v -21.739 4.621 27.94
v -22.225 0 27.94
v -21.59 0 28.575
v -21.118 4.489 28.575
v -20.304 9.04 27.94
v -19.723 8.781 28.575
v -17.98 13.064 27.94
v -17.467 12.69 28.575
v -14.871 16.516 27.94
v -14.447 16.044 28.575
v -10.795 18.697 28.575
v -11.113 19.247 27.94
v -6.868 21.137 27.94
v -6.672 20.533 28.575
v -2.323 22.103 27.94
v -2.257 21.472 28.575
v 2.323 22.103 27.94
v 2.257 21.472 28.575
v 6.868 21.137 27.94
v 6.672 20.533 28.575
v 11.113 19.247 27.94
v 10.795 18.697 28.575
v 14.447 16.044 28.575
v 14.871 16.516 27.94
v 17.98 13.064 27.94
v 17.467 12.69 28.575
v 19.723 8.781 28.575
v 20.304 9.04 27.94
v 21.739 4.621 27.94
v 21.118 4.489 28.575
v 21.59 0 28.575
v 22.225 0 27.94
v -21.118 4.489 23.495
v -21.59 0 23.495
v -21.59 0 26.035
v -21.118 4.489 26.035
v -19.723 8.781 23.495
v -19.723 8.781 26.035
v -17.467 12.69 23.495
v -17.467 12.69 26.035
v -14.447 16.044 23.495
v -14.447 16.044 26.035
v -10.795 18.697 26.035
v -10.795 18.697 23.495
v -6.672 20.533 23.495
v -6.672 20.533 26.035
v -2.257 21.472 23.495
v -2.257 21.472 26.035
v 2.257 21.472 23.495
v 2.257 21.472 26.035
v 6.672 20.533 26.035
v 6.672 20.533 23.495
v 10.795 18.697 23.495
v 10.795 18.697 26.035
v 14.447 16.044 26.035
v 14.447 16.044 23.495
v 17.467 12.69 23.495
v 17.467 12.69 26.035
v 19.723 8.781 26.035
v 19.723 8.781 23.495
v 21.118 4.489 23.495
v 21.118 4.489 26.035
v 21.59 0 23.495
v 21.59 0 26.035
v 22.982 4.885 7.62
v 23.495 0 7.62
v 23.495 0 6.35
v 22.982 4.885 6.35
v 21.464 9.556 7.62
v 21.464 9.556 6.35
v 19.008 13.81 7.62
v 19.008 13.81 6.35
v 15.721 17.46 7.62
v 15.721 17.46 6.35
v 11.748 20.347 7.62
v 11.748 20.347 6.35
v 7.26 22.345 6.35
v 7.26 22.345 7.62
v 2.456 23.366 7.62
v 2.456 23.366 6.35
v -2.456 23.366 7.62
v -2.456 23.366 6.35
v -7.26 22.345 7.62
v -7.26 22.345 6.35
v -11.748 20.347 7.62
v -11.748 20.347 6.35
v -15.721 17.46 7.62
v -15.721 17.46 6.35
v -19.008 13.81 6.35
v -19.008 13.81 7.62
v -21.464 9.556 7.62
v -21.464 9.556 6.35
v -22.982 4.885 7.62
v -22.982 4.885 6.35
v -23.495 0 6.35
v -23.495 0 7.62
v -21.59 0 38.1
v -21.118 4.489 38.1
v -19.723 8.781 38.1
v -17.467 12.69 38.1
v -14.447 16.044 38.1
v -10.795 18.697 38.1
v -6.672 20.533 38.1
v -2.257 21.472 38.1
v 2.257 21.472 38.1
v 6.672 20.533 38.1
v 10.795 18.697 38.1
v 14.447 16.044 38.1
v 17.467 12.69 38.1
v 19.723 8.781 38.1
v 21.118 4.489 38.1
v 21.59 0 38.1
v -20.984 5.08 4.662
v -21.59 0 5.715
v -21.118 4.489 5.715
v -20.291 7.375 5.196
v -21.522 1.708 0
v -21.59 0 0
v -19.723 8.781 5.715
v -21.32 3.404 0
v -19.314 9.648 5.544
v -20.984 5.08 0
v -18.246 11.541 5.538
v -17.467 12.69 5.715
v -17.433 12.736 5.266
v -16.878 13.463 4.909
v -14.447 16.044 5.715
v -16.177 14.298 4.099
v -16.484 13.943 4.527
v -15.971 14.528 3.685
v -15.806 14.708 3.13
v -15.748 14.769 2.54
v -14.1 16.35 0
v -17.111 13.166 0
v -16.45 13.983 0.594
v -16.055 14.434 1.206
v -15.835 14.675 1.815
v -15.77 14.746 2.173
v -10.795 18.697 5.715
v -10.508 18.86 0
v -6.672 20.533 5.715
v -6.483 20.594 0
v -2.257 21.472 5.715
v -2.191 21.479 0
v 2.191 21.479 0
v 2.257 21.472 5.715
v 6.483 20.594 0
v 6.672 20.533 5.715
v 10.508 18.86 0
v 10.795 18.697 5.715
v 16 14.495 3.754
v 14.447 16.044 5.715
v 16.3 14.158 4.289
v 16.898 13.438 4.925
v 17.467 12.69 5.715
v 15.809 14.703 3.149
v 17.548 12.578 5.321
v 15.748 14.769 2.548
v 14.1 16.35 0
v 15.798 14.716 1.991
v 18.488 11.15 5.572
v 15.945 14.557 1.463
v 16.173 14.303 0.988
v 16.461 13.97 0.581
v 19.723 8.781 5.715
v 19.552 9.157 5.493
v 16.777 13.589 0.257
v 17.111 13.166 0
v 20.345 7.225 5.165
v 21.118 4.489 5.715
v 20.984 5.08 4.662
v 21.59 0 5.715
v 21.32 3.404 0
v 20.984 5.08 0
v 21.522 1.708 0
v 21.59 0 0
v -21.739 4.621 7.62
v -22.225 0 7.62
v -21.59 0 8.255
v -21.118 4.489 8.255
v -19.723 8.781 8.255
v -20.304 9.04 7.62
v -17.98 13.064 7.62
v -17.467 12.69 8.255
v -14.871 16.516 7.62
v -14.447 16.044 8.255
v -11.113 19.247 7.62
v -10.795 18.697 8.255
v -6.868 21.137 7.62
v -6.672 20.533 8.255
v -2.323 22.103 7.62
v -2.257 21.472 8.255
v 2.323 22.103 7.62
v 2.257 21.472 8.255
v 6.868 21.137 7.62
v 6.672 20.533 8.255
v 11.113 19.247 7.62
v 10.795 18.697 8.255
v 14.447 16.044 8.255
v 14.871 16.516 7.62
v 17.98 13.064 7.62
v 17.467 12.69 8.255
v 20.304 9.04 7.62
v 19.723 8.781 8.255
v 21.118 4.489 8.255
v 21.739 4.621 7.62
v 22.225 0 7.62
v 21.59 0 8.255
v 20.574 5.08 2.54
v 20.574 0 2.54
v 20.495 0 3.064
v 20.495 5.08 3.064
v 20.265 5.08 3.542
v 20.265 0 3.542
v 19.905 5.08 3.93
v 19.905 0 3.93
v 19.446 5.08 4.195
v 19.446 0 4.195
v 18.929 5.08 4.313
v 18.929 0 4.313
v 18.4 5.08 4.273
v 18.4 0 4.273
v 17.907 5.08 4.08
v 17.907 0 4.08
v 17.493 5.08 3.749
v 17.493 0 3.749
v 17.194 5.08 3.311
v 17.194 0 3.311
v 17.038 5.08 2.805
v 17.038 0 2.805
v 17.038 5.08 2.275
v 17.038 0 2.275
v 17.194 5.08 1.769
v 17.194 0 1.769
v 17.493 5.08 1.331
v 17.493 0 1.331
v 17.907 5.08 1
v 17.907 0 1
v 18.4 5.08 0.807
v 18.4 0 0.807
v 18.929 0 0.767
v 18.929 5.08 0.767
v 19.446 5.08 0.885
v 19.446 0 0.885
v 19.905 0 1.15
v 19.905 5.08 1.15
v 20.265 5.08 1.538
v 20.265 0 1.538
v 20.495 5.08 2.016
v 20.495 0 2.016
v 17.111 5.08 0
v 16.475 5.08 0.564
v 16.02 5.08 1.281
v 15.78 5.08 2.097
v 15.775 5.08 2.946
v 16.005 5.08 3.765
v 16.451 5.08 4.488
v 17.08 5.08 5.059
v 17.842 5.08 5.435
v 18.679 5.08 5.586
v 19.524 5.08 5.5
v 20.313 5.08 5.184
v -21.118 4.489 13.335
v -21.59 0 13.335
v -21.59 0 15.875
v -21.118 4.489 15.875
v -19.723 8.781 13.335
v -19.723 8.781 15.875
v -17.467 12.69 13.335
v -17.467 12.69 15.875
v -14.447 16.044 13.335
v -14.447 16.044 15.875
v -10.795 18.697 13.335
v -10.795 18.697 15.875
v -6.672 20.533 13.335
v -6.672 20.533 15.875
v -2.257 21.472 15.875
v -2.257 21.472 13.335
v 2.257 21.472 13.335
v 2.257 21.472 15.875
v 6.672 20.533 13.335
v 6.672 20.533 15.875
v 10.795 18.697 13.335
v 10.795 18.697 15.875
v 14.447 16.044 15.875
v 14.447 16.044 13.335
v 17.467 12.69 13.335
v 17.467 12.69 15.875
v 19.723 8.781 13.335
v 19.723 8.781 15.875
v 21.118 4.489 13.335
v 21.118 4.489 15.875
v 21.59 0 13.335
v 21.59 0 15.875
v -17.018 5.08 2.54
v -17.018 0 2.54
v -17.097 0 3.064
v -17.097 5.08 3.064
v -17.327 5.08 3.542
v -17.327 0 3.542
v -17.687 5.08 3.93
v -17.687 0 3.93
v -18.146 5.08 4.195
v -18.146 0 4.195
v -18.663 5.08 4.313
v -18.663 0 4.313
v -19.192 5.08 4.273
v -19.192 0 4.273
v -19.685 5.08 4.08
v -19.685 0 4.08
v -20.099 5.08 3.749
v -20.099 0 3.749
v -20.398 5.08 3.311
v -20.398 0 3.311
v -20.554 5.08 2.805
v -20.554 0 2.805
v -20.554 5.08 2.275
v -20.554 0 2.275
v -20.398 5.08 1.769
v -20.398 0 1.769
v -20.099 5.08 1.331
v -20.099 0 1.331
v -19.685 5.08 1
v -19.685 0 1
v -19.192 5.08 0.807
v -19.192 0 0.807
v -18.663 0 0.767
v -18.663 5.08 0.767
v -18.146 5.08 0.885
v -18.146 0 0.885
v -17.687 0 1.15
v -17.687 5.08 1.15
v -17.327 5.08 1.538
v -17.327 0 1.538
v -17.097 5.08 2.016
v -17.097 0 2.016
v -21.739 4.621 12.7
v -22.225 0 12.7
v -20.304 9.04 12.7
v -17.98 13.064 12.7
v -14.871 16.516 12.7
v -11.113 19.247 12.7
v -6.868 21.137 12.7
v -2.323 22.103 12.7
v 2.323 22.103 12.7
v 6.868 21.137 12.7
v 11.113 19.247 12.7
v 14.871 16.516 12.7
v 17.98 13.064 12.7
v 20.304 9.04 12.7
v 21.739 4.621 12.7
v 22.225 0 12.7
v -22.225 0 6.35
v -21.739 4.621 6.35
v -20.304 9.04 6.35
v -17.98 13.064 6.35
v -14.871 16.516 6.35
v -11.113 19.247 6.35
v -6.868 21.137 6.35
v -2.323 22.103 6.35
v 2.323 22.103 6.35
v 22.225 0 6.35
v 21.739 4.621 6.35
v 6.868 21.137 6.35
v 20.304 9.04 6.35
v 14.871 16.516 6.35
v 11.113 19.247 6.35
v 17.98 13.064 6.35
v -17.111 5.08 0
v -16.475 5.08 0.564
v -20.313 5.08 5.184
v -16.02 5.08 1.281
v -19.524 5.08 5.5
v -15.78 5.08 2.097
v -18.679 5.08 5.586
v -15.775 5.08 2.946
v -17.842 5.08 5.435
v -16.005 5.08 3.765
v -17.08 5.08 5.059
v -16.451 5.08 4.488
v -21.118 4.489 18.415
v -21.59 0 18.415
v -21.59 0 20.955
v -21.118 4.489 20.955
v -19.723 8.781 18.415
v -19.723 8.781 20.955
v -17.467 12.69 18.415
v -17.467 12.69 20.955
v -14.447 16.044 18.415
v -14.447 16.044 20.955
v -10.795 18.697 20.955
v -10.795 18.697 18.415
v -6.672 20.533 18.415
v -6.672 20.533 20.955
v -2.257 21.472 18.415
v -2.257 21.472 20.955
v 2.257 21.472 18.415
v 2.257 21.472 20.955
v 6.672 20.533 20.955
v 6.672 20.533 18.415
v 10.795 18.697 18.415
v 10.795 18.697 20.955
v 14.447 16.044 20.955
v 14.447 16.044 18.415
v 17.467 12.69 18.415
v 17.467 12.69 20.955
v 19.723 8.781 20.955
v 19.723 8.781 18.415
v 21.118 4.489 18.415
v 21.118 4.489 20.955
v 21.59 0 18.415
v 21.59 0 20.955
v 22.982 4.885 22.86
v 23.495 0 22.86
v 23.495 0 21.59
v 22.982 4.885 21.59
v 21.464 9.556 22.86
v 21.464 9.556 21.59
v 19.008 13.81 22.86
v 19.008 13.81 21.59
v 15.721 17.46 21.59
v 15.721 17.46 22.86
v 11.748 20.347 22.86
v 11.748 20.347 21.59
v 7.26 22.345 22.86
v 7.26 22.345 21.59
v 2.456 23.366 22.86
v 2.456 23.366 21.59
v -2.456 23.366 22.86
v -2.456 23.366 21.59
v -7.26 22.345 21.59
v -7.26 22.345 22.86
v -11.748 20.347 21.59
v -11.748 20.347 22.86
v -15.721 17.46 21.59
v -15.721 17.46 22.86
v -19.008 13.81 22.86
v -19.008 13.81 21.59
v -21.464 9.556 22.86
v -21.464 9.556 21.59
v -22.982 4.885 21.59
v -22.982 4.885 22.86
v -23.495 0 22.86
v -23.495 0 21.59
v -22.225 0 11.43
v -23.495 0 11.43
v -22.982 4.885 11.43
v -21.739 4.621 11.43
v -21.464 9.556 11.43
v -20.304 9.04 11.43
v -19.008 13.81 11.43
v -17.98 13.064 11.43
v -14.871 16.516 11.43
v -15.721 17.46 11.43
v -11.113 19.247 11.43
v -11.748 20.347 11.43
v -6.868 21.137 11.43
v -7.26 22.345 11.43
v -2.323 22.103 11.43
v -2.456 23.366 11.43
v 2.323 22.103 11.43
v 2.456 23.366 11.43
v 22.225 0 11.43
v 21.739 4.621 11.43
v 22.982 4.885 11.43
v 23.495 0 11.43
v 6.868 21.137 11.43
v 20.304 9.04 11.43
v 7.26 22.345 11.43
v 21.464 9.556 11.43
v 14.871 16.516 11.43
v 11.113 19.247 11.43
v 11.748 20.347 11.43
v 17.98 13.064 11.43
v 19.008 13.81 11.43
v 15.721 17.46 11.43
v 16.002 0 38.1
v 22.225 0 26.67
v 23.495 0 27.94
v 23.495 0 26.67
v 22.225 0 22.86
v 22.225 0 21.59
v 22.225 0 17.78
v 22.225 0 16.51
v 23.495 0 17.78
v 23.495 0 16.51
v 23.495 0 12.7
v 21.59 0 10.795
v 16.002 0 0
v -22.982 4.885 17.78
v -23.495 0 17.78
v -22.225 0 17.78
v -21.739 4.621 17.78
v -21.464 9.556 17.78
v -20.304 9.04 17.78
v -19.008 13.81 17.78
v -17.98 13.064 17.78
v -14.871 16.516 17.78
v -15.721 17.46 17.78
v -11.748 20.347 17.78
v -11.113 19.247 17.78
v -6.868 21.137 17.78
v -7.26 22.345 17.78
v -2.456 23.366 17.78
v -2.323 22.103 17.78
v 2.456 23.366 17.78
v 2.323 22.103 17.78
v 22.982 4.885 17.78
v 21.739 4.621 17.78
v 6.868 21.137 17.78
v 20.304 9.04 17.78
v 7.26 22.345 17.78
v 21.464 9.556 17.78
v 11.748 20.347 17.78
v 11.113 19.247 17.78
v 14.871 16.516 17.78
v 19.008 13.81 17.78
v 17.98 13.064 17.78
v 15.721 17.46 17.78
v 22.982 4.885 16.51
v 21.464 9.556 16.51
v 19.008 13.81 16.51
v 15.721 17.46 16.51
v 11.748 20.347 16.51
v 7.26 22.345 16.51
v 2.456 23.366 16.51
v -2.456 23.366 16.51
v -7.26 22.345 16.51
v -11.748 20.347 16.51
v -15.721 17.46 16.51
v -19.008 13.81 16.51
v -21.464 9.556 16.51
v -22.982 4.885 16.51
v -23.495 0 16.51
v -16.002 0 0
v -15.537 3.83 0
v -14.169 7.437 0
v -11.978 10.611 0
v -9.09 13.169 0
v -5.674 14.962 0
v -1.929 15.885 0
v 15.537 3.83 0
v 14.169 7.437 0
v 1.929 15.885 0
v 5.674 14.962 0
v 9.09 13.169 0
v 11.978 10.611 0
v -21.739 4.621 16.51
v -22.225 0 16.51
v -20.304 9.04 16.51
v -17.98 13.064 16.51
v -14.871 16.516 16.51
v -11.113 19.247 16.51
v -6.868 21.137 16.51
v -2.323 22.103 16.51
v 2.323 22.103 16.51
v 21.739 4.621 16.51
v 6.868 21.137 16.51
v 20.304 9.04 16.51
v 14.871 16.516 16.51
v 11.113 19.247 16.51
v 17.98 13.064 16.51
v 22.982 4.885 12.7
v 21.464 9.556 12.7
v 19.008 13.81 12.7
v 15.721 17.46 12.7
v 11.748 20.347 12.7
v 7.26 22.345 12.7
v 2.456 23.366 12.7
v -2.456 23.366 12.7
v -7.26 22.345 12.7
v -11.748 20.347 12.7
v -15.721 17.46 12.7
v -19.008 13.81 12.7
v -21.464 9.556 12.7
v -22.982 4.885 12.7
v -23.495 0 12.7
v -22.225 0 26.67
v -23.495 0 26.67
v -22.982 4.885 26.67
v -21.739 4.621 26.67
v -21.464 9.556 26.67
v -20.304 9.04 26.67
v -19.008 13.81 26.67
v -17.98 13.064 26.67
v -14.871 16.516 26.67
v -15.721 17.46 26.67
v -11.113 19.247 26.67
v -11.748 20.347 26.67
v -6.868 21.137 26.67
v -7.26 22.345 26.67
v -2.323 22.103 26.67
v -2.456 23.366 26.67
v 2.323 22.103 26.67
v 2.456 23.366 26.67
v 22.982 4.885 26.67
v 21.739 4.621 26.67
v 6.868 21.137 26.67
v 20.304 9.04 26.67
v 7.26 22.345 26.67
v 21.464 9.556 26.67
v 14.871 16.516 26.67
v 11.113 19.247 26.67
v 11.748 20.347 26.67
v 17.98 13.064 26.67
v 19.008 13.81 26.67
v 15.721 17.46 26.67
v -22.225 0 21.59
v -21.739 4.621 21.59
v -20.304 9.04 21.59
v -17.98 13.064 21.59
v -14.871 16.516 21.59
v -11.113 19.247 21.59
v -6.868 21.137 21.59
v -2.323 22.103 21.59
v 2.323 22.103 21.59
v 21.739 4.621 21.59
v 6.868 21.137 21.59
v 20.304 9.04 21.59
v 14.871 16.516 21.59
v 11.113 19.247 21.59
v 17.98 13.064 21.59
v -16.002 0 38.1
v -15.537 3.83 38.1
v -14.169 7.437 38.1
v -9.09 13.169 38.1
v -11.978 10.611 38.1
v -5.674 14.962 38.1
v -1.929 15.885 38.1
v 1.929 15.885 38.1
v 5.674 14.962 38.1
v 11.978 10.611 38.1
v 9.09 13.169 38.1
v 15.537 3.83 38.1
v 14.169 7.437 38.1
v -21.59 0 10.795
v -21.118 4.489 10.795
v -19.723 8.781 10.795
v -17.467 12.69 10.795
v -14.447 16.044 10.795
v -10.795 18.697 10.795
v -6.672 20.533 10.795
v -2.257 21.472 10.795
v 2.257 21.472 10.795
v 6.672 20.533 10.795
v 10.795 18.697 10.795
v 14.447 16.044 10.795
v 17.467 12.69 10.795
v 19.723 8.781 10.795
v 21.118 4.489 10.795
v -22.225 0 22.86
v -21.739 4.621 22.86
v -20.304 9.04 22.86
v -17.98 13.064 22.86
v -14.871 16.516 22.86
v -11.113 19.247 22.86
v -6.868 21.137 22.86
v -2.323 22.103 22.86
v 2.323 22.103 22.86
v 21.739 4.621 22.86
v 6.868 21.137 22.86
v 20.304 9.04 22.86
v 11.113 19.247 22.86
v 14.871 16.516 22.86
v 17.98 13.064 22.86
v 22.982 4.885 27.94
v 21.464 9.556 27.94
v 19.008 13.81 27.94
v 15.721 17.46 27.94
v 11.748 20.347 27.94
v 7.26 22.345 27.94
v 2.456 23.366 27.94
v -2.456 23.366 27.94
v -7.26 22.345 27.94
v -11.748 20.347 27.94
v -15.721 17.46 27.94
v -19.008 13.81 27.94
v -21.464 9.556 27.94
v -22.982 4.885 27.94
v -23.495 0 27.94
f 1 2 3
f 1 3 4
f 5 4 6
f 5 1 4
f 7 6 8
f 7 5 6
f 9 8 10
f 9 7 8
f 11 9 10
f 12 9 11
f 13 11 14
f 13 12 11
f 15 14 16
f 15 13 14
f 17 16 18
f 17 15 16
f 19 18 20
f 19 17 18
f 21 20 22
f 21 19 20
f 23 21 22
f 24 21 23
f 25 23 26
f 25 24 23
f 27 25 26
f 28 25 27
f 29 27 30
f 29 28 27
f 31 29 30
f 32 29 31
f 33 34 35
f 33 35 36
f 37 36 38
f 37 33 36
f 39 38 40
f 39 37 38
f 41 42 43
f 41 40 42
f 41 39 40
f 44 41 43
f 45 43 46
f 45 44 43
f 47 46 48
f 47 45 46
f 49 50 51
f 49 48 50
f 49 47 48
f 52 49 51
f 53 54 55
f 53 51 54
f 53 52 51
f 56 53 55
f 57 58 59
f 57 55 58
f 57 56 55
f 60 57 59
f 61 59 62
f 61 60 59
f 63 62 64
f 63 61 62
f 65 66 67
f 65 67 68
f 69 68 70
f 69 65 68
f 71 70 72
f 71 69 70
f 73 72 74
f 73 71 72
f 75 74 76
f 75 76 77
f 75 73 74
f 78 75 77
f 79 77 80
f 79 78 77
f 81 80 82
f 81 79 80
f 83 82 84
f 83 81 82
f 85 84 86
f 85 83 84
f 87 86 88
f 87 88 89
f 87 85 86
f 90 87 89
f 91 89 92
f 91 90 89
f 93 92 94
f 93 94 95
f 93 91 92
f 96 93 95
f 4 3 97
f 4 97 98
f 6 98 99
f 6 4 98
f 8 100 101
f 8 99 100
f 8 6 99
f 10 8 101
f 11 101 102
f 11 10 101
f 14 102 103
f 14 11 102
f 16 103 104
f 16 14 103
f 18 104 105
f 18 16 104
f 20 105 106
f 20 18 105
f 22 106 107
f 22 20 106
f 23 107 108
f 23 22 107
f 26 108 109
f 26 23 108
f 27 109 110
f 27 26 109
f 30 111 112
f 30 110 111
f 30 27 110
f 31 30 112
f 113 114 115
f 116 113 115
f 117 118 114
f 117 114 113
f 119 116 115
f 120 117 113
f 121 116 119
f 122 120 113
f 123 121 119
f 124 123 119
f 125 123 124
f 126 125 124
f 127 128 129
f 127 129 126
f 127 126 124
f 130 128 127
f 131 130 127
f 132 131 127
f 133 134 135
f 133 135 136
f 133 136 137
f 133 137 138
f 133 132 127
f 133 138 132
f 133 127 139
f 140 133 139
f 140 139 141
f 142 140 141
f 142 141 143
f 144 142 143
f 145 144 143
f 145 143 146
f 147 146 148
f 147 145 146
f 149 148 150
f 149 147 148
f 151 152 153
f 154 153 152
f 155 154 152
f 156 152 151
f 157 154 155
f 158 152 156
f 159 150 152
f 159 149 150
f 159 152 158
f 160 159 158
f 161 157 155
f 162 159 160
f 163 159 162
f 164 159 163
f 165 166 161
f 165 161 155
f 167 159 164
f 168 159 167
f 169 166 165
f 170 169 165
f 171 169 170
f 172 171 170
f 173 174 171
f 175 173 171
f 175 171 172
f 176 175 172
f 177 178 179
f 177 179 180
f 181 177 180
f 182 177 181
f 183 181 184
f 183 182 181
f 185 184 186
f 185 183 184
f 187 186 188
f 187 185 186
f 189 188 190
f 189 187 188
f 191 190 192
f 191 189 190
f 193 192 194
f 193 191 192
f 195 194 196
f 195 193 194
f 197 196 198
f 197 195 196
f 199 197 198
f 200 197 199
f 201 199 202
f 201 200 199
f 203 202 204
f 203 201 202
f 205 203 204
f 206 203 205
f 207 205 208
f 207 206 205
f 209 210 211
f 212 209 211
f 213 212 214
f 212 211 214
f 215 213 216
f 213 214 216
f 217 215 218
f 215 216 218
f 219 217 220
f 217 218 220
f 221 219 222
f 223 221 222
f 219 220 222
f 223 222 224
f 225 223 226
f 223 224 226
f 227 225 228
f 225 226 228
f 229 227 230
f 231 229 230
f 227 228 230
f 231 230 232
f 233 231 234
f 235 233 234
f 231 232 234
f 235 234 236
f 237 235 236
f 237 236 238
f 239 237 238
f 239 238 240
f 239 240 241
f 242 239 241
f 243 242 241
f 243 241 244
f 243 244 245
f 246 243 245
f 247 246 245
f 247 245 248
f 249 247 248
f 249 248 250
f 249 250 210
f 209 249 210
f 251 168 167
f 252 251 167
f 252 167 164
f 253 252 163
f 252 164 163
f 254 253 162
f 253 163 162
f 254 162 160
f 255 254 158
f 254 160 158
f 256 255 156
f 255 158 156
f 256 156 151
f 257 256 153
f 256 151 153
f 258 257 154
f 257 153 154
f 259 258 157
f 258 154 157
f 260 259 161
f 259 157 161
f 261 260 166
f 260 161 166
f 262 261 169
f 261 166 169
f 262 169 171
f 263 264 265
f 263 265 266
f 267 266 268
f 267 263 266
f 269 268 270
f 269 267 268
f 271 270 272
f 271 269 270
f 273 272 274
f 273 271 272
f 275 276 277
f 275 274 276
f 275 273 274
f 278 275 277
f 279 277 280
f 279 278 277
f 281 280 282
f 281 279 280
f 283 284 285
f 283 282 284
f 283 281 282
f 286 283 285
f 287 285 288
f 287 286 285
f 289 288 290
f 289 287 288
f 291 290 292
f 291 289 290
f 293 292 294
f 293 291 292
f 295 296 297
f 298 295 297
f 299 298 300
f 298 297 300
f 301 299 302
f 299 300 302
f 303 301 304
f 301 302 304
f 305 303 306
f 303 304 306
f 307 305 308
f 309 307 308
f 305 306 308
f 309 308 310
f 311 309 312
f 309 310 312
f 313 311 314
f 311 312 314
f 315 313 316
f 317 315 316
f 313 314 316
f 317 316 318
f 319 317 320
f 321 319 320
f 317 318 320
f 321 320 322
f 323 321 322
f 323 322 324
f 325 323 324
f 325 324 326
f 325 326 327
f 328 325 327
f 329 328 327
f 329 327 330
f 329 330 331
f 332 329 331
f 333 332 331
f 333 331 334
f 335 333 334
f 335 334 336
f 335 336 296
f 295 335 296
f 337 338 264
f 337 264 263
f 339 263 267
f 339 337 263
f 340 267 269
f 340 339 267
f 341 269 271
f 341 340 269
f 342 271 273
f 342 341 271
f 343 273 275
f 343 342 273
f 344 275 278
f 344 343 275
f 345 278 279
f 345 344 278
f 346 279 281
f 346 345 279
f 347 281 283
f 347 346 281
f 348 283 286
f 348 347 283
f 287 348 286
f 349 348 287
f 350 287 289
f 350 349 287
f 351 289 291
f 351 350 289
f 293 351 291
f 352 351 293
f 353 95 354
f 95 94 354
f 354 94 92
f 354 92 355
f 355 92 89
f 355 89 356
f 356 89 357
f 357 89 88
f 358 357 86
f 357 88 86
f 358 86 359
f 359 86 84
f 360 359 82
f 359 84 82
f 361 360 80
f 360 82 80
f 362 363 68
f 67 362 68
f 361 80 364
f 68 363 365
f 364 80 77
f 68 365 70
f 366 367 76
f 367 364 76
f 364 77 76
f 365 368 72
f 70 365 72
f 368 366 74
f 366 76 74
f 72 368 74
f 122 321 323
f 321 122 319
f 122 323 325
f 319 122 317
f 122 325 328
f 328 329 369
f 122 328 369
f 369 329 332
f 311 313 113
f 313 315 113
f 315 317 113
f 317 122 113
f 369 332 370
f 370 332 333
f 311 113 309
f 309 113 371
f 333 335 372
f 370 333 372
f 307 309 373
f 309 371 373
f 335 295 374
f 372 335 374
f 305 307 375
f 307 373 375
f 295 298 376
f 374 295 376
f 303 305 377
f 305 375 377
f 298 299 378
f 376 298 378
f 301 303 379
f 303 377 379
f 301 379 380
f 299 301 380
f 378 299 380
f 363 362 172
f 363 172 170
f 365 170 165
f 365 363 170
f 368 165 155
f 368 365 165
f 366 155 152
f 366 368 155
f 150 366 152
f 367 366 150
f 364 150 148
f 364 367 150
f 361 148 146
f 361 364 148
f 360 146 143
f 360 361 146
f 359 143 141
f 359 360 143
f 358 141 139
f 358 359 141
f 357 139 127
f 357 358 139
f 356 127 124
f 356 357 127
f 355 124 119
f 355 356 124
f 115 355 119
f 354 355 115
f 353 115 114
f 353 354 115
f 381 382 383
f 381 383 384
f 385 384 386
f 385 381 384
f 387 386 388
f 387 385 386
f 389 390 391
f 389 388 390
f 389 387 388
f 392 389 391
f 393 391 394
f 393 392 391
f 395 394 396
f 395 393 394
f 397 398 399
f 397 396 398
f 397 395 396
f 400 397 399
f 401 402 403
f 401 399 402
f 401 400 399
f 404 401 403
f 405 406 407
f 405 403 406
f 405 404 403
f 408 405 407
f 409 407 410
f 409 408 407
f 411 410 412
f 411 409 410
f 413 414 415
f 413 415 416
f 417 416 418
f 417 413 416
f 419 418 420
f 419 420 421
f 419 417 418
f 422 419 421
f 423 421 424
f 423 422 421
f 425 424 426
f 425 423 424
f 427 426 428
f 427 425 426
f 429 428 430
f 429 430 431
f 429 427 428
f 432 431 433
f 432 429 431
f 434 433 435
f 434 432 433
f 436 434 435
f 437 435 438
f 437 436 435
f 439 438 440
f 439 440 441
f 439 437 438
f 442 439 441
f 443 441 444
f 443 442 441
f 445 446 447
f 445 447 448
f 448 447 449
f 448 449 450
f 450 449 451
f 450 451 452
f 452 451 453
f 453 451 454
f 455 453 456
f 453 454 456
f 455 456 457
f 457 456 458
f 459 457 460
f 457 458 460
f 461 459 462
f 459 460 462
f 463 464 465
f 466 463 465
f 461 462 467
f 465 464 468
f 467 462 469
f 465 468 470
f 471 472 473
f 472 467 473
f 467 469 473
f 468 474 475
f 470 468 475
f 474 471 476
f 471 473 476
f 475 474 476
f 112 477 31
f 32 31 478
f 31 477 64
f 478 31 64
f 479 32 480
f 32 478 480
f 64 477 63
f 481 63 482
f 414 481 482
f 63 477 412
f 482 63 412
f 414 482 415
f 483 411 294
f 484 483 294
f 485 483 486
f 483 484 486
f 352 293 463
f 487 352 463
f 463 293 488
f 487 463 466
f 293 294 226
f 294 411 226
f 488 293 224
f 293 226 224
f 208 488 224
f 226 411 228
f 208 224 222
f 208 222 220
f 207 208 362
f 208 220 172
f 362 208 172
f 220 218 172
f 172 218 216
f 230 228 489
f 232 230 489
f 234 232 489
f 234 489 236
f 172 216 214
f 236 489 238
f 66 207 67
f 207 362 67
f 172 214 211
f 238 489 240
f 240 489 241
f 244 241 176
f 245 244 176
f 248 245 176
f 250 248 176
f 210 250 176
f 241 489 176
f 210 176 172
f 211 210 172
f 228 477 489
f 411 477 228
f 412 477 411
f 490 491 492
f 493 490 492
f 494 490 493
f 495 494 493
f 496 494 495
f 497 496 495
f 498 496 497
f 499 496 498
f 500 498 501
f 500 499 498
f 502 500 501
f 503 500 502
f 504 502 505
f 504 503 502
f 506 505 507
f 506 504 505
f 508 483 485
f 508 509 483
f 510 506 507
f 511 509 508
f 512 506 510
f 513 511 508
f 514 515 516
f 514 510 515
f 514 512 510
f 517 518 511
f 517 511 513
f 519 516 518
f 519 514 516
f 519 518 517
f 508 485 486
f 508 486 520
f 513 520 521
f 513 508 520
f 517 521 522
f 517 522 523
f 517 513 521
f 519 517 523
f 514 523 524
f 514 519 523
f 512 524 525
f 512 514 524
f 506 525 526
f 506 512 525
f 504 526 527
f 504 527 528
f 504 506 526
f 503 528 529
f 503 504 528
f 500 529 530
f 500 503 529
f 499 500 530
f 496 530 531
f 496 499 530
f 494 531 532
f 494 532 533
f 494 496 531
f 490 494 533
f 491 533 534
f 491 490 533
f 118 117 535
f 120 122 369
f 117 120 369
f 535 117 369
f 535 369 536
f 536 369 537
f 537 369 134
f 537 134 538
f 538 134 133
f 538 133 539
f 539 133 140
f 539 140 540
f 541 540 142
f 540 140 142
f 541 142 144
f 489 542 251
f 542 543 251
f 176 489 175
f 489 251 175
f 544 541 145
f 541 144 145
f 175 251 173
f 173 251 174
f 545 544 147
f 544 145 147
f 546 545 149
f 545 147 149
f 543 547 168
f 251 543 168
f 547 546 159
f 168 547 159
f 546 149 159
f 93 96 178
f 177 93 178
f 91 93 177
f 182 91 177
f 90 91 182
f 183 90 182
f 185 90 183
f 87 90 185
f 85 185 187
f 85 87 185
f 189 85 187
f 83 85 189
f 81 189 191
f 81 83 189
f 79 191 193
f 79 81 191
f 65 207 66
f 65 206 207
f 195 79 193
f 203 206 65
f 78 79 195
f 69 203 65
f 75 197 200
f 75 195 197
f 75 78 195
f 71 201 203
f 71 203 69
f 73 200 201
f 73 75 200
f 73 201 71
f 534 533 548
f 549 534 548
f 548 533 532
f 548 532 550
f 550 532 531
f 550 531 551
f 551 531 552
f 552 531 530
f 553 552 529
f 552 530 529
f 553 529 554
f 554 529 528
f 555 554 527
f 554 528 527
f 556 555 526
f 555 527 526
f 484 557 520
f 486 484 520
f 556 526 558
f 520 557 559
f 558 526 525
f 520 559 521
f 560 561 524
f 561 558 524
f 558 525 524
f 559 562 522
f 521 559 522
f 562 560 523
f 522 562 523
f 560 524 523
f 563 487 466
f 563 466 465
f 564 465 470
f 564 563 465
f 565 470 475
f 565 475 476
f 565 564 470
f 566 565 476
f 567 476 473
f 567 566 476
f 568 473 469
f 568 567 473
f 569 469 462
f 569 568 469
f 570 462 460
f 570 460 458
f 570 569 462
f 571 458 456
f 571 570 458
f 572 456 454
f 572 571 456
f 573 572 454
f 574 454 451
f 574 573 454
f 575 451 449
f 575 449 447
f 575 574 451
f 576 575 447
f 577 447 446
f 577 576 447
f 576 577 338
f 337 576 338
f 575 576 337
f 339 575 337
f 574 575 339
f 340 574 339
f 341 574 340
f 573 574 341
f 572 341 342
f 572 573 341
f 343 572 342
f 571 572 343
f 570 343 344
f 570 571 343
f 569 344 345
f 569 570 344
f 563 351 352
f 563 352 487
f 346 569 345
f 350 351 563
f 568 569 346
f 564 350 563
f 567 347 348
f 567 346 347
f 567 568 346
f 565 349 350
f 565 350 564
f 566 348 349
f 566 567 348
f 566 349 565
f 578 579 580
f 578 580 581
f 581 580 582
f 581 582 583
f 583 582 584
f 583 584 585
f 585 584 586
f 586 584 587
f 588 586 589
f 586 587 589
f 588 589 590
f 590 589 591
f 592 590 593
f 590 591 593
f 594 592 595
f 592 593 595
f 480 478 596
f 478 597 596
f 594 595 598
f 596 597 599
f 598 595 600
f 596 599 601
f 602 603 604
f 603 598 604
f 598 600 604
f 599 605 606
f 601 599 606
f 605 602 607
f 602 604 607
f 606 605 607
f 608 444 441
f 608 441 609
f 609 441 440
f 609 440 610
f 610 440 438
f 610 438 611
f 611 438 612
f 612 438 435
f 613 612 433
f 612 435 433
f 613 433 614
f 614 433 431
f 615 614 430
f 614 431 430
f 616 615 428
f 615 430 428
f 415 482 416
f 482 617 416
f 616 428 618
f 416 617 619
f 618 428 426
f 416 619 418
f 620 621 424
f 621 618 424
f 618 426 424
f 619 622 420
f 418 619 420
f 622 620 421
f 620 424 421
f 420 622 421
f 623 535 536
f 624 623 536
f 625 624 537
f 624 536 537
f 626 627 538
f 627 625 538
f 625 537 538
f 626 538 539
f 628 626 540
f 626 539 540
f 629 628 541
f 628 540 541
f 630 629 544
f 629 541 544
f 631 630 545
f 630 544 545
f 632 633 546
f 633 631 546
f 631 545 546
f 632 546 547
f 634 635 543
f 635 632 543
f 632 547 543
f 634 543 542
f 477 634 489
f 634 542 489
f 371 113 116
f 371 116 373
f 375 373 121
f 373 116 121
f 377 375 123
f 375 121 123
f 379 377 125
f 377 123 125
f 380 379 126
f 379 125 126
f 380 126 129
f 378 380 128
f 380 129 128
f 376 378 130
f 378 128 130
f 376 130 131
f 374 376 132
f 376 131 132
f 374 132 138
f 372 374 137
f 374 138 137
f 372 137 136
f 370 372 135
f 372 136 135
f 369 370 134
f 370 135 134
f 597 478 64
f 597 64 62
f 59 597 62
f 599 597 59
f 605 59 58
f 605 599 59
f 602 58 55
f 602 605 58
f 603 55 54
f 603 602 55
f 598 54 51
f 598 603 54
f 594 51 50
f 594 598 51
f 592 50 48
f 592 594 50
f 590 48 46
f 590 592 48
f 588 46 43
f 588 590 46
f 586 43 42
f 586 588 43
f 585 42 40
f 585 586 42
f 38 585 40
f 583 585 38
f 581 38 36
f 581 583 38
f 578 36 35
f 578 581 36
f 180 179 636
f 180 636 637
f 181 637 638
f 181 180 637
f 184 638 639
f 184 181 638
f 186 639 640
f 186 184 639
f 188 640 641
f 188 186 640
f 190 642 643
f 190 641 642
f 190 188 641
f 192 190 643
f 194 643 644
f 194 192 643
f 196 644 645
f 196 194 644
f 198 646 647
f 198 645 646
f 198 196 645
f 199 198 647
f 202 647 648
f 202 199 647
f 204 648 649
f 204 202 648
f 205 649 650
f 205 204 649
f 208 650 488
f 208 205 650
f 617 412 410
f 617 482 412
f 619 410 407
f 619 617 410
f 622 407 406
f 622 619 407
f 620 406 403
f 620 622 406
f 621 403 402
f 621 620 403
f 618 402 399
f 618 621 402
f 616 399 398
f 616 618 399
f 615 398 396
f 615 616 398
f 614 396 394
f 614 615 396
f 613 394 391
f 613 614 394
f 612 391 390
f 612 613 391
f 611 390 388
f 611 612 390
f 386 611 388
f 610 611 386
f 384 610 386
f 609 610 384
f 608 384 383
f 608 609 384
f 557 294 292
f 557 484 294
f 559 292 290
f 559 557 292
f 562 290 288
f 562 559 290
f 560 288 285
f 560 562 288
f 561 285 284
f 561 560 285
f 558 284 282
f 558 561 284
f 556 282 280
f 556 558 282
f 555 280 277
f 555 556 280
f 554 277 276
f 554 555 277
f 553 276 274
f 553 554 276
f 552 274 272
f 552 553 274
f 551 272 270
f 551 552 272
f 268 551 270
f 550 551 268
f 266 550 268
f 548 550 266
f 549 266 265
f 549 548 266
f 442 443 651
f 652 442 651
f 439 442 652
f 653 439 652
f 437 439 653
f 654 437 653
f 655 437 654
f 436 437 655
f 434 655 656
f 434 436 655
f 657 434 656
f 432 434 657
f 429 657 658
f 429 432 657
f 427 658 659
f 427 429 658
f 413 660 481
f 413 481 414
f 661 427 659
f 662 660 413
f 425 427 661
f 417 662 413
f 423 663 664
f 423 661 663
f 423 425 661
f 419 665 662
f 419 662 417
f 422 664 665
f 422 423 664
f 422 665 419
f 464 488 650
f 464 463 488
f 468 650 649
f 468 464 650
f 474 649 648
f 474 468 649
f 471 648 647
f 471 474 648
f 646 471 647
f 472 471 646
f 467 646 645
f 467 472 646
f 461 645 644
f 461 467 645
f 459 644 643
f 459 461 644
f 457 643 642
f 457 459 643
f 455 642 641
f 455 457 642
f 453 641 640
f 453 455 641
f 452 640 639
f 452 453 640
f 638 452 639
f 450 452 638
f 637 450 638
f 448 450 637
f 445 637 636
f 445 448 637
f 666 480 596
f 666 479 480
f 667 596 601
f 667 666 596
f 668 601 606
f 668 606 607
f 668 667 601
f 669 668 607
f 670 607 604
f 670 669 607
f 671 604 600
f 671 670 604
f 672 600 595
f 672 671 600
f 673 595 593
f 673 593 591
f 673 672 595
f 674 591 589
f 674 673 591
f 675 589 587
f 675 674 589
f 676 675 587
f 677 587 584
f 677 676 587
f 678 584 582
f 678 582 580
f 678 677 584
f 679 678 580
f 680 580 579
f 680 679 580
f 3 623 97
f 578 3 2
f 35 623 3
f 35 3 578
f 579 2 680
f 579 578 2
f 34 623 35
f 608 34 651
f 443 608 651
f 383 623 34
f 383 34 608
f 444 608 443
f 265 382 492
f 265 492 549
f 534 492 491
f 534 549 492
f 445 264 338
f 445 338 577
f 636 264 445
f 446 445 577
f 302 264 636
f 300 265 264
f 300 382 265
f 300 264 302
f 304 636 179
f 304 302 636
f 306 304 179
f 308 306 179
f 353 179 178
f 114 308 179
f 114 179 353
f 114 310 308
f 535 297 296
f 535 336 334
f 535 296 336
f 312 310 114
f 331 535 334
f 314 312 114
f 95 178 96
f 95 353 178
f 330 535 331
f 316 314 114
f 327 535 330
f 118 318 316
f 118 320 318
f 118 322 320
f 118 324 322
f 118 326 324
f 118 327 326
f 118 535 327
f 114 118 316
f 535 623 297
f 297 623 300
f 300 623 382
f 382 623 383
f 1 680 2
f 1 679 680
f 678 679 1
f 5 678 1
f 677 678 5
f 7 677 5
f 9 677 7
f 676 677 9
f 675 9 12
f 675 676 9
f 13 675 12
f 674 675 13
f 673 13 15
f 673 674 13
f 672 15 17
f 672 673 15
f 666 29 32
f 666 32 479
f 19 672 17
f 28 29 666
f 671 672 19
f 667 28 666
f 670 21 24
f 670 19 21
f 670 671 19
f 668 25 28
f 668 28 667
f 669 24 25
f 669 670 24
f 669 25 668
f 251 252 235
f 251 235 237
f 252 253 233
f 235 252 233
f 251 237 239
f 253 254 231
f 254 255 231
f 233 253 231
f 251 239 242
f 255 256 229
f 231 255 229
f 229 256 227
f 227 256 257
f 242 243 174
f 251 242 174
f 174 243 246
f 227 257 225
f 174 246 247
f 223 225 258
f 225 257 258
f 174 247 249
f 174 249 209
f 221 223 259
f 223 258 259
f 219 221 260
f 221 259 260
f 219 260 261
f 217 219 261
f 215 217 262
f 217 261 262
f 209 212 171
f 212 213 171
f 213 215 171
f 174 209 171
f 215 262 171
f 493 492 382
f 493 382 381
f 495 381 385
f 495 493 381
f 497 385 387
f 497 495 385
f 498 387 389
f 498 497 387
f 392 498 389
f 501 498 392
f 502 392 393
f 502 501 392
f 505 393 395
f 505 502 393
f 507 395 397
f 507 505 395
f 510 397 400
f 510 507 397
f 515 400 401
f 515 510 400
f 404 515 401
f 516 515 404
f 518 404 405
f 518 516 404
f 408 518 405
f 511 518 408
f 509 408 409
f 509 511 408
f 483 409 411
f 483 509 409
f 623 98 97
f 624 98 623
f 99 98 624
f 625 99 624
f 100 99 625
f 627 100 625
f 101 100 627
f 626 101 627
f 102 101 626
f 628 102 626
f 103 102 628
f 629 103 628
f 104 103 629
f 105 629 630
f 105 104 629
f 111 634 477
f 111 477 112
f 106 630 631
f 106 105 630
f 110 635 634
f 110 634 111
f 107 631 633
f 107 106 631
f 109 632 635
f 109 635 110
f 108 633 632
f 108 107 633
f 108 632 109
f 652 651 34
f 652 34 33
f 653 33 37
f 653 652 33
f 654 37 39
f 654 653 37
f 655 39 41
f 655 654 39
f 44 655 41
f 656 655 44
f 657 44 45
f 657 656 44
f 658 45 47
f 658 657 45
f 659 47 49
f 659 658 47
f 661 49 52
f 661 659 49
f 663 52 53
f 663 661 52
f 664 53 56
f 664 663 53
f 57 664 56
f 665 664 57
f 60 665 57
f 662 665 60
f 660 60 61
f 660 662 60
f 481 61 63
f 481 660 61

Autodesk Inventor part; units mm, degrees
ref_plane "YZ Plane" through (0, 0, 0) normal (1, 0, 0) x (0, 1, 0)
sketch "Sketch1" plane through (0, 0, 0) normal (0, 0, 1) x (1, 0, 0)
  arc A0 (16.002, 0) -> (-16.002, 0) centre (0, 0) ccw
  arc A1 (21.59, 0) -> (-21.59, 0) centre (0, 0) ccw
  line L0 (-16.002, 0) -> (-21.59, 0)
  line L1 (16.002, 0) -> (21.59, 0)
  dimension "d0" = 43.18
  dimension "d1" = 32.004
extrude "Extrusion1" add sketch "Sketch1" along normal blind 38.1
ref_plane "Work Plane1" through (0, 0, 27.94) normal (0, 0, 1) x (1, 0, 0)
sketch "Sketch2" plane through (0, 0, 27.94) normal (0, 0, 1) x (1, 0, 0)
  arc A0 (21.59, 0) -> (-21.59, 0) centre (0, 0) ccw projected
  arc A1 (23.495, 0) -> (-23.495, 0) centre (0, 0) ccw
  line L0 (-21.59, 0) -> (-23.495, 0)
  line L1 (16.002, 0) -> (21.59, 0) projected
  line L2 (23.495, 0) -> (21.59, 0)
  dimension "d5" = 1.905
extrude "Extrusion2" add sketch "Sketch2" against normal blind 1.27
chamfer "Chamfer1" distance 0.635 angle 45 2 edges at (0, 21.59, 27.94) (0, 21.59, 26.67)
pattern_linear "Rectangular Pattern1" count 5 spacing 5.08 along (0, 0, -1) of "Extrusion2", "Chamfer1"
sketch "Sketch3" plane through (16.002, 0, 0) normal (0, -1, 0) x (1, 0, 0)
  line L0 (0, 0) -> (5.588, 0) construction
  line L1 (5.588, 0) -> (5.588, 5.715) construction
  line L2 (6.223, 6.35) -> (5.588, 5.715) construction
  line L3 (7.493, 6.35) -> (6.223, 6.35) construction
  line L4 (7.493, 7.62) -> (7.493, 6.35) construction
  line L5 (7.493, 7.62) -> (6.223, 7.62) construction
  line L6 (5.588, 8.255) -> (6.223, 7.62) construction
  line L7 (5.588, 8.255) -> (5.588, 10.795) construction
  line L8 (6.223, 11.43) -> (5.588, 10.795) construction
  line L9 (7.493, 11.43) -> (6.223, 11.43) construction
  line L10 (7.493, 12.7) -> (7.493, 11.43) construction
  line L11 (7.493, 12.7) -> (6.223, 12.7) construction
  line L12 (5.588, 13.335) -> (6.223, 12.7) construction
  line L13 (5.588, 13.335) -> (5.588, 15.875) construction
  line L14 (6.223, 16.51) -> (5.588, 15.875) construction
  line L15 (7.493, 16.51) -> (6.223, 16.51) construction
  line L16 (7.493, 17.78) -> (7.493, 16.51) construction
  line L17 (7.493, 17.78) -> (6.223, 17.78) construction
  line L18 (5.588, 18.415) -> (6.223, 17.78) construction
  line L19 (5.588, 18.415) -> (5.588, 20.955) construction
  line L20 (6.223, 21.59) -> (5.588, 20.955) construction
  line L21 (7.493, 21.59) -> (6.223, 21.59) construction
  line L22 (7.493, 22.86) -> (7.493, 21.59) construction
  line L23 (7.493, 22.86) -> (6.223, 22.86) construction
  line L24 (5.588, 23.495) -> (6.223, 22.86) construction
  line L25 (5.588, 23.495) -> (5.588, 26.035) construction
  line L26 (6.223, 26.67) -> (5.588, 26.035) construction
  line L27 (7.493, 26.67) -> (6.223, 26.67) construction
  line L28 (7.493, 27.94) -> (7.493, 26.67) construction
  line L29 (7.493, 27.94) -> (6.223, 27.94) construction
  line L30 (5.588, 28.575) -> (6.223, 27.94) construction
  line L31 (5.588, 28.575) -> (5.588, 38.1) construction
  line L32 (0, 38.1) -> (5.588, 38.1) construction
  line L33 (0, 0) -> (0, 38.1) construction
  line L34 (-37.592, 0) -> (-32.004, 0) construction
  line L35 (-32.004, 0) -> (-32.004, 38.1) construction
  line L36 (-37.592, 38.1) -> (-32.004, 38.1) construction
  line L37 (-37.592, 28.575) -> (-37.592, 38.1) construction
  line L38 (-38.227, 27.94) -> (-37.592, 28.575) construction
  line L39 (-38.227, 27.94) -> (-39.497, 27.94) construction
  line L40 (-39.497, 27.94) -> (-39.497, 26.67) construction
  line L41 (-38.227, 26.67) -> (-39.497, 26.67) construction
  line L42 (-37.592, 26.035) -> (-38.227, 26.67) construction
  line L43 (-37.592, 23.495) -> (-37.592, 26.035) construction
  line L44 (-38.227, 22.86) -> (-37.592, 23.495) construction
  line L45 (-38.227, 22.86) -> (-39.497, 22.86) construction
  line L46 (-39.497, 22.86) -> (-39.497, 21.59) construction
  line L47 (-38.227, 21.59) -> (-39.497, 21.59) construction
  line L48 (-37.592, 20.955) -> (-38.227, 21.59) construction
  line L49 (-37.592, 18.415) -> (-37.592, 20.955) construction
  line L50 (-38.227, 17.78) -> (-37.592, 18.415) construction
  line L51 (-38.227, 17.78) -> (-39.497, 17.78) construction
  line L52 (-39.497, 17.78) -> (-39.497, 16.51) construction
  line L53 (-38.227, 16.51) -> (-39.497, 16.51) construction
  line L54 (-37.592, 15.875) -> (-38.227, 16.51) construction
  line L55 (-37.592, 13.335) -> (-37.592, 15.875) construction
  line L56 (-38.227, 12.7) -> (-37.592, 13.335) construction
  line L57 (-38.227, 12.7) -> (-39.497, 12.7) construction
  line L58 (-39.497, 12.7) -> (-39.497, 11.43) construction
  line L59 (-38.227, 11.43) -> (-39.497, 11.43) construction
  line L60 (-37.592, 10.795) -> (-38.227, 11.43) construction
  line L61 (-37.592, 8.255) -> (-37.592, 10.795) construction
  line L62 (-38.227, 7.62) -> (-37.592, 8.255) construction
  line L63 (-38.227, 7.62) -> (-39.497, 7.62) construction
  line L64 (-39.497, 7.62) -> (-39.497, 6.35) construction
  line L65 (-38.227, 6.35) -> (-39.497, 6.35) construction
  line L66 (-37.592, 5.715) -> (-38.227, 6.35) construction
  line L67 (-37.592, 0) -> (-37.592, 5.715) construction
  circle A0 centre (2.794, 2.54) radius 1.778
  circle A1 centre (-34.798, 2.54) radius 1.778
  point P0 (-16.002, 0)
  dimension "d14" = 3.556
  dimension "d15" = 2.54
  dimension "d16" = 3.556
extrude "Extrusion3" cut sketch "Sketch3" against normal through all
ref_plane "Work Plane2" through (16.002, 25.4, 0) normal (0, -1, 0) x (1, 0, 0)
sketch "Sketch4" plane through (16.002, 25.4, 0) normal (0, -1, 0) x (1, 0, 0)
  circle A0 centre (2.794, 2.54) radius 1.778 construction
  circle A1 centre (-34.798, 2.54) radius 1.778 construction
  circle A2 centre (2.794, 2.54) radius 3.048
  circle A3 centre (-34.798, 2.54) radius 3.048
  line L0 (2.794, -0.508) -> (7.3935, -0.1769)
  line L1 (7.3935, -0.1769) -> (6.0075, 2.6942)
  line L2 (6.0075, 2.6942) -> (5.8411, 2.6139)
  line L3 (-34.7976, -0.508) -> (-34.7976, -3.1659)
  line L4 (-34.7976, -3.1659) -> (-38.8338, -2.6207)
  line L5 (-38.8338, -2.6207) -> (-39.8503, 2.0729)
  line L6 (-39.8503, 2.0729) -> (-37.8451, 2.6139)
  point P0 (-16.002, 0)
  dimension "d20" = 6.096
  dimension "d21" = 6.096
extrude "Extrusion4" cut sketch "Sketch4" along normal blind 20.32
properties part number "CoreOpposite" material "ABS Plastic"
